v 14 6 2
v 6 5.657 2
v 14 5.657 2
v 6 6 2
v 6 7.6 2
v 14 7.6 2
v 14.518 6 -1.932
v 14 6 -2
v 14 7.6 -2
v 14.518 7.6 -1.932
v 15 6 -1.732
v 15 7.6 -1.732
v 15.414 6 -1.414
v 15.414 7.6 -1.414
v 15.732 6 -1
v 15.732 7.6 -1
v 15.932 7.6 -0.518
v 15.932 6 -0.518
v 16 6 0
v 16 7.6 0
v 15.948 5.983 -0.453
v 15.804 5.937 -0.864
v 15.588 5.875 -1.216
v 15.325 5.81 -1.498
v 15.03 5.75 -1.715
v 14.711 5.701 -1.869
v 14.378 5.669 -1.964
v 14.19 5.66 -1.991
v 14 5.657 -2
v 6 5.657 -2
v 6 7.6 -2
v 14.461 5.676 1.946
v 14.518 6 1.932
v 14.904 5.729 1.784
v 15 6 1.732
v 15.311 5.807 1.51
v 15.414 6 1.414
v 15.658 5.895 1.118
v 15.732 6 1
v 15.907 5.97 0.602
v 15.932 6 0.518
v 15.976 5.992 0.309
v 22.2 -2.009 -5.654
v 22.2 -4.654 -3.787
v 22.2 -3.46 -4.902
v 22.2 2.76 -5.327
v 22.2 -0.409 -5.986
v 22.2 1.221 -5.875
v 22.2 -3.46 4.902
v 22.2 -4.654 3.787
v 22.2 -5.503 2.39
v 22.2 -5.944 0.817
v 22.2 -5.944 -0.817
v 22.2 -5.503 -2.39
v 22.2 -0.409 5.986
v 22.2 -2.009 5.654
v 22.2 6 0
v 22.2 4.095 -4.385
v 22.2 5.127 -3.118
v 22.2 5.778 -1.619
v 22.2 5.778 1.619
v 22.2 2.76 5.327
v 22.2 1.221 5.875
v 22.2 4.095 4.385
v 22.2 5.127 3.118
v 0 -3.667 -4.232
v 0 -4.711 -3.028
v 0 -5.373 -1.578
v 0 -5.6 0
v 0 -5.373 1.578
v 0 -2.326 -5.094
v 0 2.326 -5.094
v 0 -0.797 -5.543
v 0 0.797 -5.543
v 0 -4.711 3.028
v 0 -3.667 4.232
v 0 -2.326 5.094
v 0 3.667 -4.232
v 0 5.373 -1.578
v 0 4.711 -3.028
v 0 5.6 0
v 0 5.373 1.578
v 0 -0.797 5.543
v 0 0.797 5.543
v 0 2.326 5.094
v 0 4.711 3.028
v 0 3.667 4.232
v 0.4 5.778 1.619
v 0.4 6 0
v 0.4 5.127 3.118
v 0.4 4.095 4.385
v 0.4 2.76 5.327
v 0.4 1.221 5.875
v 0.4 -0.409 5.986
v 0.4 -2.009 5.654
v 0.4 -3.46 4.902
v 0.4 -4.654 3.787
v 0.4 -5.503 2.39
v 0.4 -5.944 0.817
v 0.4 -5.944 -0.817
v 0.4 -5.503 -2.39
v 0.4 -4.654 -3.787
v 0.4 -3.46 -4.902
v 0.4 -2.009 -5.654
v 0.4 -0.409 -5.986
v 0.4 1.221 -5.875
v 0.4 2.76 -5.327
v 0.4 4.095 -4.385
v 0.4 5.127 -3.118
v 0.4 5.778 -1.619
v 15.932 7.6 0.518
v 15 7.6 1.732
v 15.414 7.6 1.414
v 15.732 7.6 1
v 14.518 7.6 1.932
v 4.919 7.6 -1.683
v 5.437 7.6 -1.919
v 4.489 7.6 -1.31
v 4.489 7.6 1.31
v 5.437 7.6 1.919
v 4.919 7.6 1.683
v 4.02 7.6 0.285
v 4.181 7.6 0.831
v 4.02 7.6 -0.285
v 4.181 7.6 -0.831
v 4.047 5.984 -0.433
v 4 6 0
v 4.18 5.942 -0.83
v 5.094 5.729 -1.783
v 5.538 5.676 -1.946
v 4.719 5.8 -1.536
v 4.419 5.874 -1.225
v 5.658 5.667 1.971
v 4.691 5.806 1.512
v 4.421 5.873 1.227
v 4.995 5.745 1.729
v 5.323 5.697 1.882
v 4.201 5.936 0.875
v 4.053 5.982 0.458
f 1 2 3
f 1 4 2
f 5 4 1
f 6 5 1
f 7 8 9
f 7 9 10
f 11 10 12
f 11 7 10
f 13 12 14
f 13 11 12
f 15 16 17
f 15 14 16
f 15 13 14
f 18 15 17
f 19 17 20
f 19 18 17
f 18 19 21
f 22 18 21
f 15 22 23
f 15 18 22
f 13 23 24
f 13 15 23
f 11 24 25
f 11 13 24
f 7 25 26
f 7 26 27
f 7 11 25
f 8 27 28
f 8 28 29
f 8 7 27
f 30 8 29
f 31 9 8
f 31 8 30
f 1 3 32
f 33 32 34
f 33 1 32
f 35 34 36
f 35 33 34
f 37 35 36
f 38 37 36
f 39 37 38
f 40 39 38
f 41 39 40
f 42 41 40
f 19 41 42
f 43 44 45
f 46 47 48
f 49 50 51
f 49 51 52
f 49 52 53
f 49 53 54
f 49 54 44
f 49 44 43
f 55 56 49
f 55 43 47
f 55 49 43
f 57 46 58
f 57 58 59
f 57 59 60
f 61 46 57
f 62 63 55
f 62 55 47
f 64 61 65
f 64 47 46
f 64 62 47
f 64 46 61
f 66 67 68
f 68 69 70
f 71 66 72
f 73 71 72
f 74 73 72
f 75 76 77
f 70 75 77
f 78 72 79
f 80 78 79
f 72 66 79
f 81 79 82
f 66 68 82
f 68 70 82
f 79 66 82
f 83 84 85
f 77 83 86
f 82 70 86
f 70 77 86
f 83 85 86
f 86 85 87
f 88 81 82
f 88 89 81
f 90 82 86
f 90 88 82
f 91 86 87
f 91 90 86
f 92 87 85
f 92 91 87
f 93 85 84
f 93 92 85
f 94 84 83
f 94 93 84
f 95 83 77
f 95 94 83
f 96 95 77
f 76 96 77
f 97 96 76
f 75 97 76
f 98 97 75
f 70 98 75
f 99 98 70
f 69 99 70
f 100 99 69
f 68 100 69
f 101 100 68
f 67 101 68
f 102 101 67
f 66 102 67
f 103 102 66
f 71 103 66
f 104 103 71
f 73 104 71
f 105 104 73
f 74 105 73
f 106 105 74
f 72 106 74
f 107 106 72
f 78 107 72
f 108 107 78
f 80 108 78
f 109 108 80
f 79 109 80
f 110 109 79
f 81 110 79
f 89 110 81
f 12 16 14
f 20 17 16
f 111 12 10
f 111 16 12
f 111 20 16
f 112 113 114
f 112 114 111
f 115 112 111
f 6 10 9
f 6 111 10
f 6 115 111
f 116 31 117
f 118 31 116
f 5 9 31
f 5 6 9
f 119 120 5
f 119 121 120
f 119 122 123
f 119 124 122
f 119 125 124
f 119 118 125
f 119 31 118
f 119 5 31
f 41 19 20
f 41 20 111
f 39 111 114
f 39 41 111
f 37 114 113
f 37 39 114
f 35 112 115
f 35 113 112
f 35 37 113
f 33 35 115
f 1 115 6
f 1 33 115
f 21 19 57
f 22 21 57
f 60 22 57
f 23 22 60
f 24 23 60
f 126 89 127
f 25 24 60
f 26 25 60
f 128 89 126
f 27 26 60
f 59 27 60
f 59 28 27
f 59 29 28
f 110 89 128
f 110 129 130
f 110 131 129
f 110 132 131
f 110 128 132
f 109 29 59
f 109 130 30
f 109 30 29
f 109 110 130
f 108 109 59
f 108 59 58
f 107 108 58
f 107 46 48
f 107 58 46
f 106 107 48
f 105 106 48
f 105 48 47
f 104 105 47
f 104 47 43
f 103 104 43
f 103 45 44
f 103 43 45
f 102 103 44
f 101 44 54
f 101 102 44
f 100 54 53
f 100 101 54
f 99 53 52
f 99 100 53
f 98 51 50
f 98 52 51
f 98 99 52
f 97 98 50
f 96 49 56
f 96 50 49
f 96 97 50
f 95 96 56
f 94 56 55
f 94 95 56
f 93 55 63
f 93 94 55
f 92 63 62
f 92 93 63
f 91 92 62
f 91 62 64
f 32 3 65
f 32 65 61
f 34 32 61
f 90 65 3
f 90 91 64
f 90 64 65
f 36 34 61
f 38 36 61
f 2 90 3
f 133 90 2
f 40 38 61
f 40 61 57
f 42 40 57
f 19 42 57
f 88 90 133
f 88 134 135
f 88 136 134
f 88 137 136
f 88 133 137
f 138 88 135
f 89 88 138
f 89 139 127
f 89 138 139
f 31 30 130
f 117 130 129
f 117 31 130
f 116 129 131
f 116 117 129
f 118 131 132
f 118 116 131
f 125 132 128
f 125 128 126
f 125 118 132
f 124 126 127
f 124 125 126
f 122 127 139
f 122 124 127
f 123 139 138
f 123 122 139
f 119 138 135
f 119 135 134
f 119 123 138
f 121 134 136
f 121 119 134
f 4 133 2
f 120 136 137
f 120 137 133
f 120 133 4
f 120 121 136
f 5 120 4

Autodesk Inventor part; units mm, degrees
ref_plane "YZ Plane" through (0, 0, 0) normal (1, 0, 0) x (0, 1, 0)
ref_plane "XY Plane" through (0, 0, 0) normal (0, 0, 1) x (1, 0, 0)
sketch "Sketch1" plane through (0, 0, 0) normal (1, 0, 0) x (0, 1, 0)
  circle A0 centre (0, 0) radius 6
  dimension "d0" = 12
extrude "Extrusion1" add sketch "Sketch1" along normal blind 22.2
ref_plane "Work Plane1" through (0, 6, 0) normal (0, 1, 0) x (-1, 0, 0)
sketch "Sketch2" plane through (0, 6, 0) normal (0, 1, 0) x (-1, 0, 0)
  line L0 (0, 6) -> (0, -6) projected
  line L1 (-6, 2) -> (-14, 2)
  line L2 (-16, 0) -> (-16, 0)
  line L3 (-14, -2) -> (-6, -2)
  line L4 (-4, 0) -> (-4, 0)
  arc A0 (-4, 0) -> (-6, 2) centre (-6, 0) ccw
  arc A1 (-6, -2) -> (-4, 0) centre (-6, 0) ccw
  arc A2 (-16, 0) -> (-14, -2) centre (-14, 0) ccw
  arc A3 (-14, 2) -> (-16, 0) centre (-14, 0) ccw
  point P0 (0, 0)
  point P1 (-16, -2)
  point P2 (-16, 2)
  point P3 (0, 0)
  point P4 (-16, 0)
  dimension "d3" = 4
  dimension "d4" = 2
  dimension "d5" = 6
  dimension "d6" = 8
extrude "Extrusion2" add sketch "Sketch2" along normal blind 1.6 and the other way blind 1
chamfer "Chamfer1" distance 0.4 angle 45 1 edges at (0, -6, 0)
properties part number "input shaft nmrv-40"
